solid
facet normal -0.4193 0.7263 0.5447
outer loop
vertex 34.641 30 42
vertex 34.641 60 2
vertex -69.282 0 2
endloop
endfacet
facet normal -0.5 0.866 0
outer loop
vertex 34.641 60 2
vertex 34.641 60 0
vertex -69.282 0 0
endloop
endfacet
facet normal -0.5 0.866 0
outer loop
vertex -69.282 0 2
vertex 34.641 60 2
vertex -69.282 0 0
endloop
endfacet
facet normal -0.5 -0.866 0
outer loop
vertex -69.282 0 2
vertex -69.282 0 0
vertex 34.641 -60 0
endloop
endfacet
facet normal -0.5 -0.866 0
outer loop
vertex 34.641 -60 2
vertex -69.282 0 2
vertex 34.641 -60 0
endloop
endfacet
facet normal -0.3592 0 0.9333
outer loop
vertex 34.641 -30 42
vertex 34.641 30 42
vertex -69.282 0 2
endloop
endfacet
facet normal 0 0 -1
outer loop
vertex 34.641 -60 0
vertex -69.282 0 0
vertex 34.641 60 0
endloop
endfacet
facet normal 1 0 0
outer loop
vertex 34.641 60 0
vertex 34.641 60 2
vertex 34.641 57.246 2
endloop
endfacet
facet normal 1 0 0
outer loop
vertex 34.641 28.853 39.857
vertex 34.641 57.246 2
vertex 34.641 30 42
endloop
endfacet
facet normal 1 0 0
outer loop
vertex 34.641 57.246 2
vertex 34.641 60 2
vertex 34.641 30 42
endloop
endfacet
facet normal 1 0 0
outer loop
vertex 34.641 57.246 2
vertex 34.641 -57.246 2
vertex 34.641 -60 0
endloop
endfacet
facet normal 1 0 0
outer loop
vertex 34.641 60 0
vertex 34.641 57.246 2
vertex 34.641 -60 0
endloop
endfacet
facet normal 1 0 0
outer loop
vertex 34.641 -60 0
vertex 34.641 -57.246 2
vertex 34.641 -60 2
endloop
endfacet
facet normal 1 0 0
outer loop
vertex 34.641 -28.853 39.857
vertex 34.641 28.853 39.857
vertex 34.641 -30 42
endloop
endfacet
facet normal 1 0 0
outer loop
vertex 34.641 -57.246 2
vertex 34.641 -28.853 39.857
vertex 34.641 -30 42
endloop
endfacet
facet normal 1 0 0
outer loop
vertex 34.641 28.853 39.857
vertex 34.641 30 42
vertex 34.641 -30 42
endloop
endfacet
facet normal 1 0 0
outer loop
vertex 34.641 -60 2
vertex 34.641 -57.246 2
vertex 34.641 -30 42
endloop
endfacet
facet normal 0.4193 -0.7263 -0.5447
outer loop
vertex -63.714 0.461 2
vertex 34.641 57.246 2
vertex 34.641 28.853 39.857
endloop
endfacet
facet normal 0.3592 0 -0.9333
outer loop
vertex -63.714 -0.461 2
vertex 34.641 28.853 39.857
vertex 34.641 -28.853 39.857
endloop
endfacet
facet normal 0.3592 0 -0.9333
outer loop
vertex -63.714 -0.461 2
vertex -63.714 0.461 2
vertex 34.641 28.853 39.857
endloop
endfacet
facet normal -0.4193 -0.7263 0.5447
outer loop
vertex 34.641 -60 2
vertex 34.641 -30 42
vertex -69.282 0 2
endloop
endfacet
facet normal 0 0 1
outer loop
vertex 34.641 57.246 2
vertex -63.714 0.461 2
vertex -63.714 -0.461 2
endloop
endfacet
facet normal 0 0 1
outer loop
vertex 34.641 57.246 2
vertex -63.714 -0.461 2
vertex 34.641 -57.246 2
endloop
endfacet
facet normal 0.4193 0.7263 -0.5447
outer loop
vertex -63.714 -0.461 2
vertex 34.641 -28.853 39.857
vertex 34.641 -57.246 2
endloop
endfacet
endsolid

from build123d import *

# Parameters (mm, degrees)
F1_DEPTH = 2
F4_T     = -2


with BuildPart() as f1:
    # F0 (on Top) → F1 (new body)
    with BuildSketch(Plane.XY):
        Polygon((34.6410161514, -60), (34.6410161514, 60), (-69.2820323028, 0), align=None)
    extrude(amount=F1_DEPTH)

    # F2 (on face) → F3 section 0
    with BuildSketch(Plane.YZ.offset(34.6410161514), mode=Mode.PRIVATE) as f3_s0:
        Polygon((60, 2), (30, 42), (0, 42), (-30, 42), (-60, 2), align=None)
    loft([f3_s0.sketch, Vertex(-69.2820323028, 0, 2)])

    # F4
    f4_openings = [f1.faces().sort_by_distance(p)[0] for p in [
        (34.641016, 0, 18.604167),
    ]]
    offset(amount=F4_T, openings=f4_openings)


solid = f1.part
